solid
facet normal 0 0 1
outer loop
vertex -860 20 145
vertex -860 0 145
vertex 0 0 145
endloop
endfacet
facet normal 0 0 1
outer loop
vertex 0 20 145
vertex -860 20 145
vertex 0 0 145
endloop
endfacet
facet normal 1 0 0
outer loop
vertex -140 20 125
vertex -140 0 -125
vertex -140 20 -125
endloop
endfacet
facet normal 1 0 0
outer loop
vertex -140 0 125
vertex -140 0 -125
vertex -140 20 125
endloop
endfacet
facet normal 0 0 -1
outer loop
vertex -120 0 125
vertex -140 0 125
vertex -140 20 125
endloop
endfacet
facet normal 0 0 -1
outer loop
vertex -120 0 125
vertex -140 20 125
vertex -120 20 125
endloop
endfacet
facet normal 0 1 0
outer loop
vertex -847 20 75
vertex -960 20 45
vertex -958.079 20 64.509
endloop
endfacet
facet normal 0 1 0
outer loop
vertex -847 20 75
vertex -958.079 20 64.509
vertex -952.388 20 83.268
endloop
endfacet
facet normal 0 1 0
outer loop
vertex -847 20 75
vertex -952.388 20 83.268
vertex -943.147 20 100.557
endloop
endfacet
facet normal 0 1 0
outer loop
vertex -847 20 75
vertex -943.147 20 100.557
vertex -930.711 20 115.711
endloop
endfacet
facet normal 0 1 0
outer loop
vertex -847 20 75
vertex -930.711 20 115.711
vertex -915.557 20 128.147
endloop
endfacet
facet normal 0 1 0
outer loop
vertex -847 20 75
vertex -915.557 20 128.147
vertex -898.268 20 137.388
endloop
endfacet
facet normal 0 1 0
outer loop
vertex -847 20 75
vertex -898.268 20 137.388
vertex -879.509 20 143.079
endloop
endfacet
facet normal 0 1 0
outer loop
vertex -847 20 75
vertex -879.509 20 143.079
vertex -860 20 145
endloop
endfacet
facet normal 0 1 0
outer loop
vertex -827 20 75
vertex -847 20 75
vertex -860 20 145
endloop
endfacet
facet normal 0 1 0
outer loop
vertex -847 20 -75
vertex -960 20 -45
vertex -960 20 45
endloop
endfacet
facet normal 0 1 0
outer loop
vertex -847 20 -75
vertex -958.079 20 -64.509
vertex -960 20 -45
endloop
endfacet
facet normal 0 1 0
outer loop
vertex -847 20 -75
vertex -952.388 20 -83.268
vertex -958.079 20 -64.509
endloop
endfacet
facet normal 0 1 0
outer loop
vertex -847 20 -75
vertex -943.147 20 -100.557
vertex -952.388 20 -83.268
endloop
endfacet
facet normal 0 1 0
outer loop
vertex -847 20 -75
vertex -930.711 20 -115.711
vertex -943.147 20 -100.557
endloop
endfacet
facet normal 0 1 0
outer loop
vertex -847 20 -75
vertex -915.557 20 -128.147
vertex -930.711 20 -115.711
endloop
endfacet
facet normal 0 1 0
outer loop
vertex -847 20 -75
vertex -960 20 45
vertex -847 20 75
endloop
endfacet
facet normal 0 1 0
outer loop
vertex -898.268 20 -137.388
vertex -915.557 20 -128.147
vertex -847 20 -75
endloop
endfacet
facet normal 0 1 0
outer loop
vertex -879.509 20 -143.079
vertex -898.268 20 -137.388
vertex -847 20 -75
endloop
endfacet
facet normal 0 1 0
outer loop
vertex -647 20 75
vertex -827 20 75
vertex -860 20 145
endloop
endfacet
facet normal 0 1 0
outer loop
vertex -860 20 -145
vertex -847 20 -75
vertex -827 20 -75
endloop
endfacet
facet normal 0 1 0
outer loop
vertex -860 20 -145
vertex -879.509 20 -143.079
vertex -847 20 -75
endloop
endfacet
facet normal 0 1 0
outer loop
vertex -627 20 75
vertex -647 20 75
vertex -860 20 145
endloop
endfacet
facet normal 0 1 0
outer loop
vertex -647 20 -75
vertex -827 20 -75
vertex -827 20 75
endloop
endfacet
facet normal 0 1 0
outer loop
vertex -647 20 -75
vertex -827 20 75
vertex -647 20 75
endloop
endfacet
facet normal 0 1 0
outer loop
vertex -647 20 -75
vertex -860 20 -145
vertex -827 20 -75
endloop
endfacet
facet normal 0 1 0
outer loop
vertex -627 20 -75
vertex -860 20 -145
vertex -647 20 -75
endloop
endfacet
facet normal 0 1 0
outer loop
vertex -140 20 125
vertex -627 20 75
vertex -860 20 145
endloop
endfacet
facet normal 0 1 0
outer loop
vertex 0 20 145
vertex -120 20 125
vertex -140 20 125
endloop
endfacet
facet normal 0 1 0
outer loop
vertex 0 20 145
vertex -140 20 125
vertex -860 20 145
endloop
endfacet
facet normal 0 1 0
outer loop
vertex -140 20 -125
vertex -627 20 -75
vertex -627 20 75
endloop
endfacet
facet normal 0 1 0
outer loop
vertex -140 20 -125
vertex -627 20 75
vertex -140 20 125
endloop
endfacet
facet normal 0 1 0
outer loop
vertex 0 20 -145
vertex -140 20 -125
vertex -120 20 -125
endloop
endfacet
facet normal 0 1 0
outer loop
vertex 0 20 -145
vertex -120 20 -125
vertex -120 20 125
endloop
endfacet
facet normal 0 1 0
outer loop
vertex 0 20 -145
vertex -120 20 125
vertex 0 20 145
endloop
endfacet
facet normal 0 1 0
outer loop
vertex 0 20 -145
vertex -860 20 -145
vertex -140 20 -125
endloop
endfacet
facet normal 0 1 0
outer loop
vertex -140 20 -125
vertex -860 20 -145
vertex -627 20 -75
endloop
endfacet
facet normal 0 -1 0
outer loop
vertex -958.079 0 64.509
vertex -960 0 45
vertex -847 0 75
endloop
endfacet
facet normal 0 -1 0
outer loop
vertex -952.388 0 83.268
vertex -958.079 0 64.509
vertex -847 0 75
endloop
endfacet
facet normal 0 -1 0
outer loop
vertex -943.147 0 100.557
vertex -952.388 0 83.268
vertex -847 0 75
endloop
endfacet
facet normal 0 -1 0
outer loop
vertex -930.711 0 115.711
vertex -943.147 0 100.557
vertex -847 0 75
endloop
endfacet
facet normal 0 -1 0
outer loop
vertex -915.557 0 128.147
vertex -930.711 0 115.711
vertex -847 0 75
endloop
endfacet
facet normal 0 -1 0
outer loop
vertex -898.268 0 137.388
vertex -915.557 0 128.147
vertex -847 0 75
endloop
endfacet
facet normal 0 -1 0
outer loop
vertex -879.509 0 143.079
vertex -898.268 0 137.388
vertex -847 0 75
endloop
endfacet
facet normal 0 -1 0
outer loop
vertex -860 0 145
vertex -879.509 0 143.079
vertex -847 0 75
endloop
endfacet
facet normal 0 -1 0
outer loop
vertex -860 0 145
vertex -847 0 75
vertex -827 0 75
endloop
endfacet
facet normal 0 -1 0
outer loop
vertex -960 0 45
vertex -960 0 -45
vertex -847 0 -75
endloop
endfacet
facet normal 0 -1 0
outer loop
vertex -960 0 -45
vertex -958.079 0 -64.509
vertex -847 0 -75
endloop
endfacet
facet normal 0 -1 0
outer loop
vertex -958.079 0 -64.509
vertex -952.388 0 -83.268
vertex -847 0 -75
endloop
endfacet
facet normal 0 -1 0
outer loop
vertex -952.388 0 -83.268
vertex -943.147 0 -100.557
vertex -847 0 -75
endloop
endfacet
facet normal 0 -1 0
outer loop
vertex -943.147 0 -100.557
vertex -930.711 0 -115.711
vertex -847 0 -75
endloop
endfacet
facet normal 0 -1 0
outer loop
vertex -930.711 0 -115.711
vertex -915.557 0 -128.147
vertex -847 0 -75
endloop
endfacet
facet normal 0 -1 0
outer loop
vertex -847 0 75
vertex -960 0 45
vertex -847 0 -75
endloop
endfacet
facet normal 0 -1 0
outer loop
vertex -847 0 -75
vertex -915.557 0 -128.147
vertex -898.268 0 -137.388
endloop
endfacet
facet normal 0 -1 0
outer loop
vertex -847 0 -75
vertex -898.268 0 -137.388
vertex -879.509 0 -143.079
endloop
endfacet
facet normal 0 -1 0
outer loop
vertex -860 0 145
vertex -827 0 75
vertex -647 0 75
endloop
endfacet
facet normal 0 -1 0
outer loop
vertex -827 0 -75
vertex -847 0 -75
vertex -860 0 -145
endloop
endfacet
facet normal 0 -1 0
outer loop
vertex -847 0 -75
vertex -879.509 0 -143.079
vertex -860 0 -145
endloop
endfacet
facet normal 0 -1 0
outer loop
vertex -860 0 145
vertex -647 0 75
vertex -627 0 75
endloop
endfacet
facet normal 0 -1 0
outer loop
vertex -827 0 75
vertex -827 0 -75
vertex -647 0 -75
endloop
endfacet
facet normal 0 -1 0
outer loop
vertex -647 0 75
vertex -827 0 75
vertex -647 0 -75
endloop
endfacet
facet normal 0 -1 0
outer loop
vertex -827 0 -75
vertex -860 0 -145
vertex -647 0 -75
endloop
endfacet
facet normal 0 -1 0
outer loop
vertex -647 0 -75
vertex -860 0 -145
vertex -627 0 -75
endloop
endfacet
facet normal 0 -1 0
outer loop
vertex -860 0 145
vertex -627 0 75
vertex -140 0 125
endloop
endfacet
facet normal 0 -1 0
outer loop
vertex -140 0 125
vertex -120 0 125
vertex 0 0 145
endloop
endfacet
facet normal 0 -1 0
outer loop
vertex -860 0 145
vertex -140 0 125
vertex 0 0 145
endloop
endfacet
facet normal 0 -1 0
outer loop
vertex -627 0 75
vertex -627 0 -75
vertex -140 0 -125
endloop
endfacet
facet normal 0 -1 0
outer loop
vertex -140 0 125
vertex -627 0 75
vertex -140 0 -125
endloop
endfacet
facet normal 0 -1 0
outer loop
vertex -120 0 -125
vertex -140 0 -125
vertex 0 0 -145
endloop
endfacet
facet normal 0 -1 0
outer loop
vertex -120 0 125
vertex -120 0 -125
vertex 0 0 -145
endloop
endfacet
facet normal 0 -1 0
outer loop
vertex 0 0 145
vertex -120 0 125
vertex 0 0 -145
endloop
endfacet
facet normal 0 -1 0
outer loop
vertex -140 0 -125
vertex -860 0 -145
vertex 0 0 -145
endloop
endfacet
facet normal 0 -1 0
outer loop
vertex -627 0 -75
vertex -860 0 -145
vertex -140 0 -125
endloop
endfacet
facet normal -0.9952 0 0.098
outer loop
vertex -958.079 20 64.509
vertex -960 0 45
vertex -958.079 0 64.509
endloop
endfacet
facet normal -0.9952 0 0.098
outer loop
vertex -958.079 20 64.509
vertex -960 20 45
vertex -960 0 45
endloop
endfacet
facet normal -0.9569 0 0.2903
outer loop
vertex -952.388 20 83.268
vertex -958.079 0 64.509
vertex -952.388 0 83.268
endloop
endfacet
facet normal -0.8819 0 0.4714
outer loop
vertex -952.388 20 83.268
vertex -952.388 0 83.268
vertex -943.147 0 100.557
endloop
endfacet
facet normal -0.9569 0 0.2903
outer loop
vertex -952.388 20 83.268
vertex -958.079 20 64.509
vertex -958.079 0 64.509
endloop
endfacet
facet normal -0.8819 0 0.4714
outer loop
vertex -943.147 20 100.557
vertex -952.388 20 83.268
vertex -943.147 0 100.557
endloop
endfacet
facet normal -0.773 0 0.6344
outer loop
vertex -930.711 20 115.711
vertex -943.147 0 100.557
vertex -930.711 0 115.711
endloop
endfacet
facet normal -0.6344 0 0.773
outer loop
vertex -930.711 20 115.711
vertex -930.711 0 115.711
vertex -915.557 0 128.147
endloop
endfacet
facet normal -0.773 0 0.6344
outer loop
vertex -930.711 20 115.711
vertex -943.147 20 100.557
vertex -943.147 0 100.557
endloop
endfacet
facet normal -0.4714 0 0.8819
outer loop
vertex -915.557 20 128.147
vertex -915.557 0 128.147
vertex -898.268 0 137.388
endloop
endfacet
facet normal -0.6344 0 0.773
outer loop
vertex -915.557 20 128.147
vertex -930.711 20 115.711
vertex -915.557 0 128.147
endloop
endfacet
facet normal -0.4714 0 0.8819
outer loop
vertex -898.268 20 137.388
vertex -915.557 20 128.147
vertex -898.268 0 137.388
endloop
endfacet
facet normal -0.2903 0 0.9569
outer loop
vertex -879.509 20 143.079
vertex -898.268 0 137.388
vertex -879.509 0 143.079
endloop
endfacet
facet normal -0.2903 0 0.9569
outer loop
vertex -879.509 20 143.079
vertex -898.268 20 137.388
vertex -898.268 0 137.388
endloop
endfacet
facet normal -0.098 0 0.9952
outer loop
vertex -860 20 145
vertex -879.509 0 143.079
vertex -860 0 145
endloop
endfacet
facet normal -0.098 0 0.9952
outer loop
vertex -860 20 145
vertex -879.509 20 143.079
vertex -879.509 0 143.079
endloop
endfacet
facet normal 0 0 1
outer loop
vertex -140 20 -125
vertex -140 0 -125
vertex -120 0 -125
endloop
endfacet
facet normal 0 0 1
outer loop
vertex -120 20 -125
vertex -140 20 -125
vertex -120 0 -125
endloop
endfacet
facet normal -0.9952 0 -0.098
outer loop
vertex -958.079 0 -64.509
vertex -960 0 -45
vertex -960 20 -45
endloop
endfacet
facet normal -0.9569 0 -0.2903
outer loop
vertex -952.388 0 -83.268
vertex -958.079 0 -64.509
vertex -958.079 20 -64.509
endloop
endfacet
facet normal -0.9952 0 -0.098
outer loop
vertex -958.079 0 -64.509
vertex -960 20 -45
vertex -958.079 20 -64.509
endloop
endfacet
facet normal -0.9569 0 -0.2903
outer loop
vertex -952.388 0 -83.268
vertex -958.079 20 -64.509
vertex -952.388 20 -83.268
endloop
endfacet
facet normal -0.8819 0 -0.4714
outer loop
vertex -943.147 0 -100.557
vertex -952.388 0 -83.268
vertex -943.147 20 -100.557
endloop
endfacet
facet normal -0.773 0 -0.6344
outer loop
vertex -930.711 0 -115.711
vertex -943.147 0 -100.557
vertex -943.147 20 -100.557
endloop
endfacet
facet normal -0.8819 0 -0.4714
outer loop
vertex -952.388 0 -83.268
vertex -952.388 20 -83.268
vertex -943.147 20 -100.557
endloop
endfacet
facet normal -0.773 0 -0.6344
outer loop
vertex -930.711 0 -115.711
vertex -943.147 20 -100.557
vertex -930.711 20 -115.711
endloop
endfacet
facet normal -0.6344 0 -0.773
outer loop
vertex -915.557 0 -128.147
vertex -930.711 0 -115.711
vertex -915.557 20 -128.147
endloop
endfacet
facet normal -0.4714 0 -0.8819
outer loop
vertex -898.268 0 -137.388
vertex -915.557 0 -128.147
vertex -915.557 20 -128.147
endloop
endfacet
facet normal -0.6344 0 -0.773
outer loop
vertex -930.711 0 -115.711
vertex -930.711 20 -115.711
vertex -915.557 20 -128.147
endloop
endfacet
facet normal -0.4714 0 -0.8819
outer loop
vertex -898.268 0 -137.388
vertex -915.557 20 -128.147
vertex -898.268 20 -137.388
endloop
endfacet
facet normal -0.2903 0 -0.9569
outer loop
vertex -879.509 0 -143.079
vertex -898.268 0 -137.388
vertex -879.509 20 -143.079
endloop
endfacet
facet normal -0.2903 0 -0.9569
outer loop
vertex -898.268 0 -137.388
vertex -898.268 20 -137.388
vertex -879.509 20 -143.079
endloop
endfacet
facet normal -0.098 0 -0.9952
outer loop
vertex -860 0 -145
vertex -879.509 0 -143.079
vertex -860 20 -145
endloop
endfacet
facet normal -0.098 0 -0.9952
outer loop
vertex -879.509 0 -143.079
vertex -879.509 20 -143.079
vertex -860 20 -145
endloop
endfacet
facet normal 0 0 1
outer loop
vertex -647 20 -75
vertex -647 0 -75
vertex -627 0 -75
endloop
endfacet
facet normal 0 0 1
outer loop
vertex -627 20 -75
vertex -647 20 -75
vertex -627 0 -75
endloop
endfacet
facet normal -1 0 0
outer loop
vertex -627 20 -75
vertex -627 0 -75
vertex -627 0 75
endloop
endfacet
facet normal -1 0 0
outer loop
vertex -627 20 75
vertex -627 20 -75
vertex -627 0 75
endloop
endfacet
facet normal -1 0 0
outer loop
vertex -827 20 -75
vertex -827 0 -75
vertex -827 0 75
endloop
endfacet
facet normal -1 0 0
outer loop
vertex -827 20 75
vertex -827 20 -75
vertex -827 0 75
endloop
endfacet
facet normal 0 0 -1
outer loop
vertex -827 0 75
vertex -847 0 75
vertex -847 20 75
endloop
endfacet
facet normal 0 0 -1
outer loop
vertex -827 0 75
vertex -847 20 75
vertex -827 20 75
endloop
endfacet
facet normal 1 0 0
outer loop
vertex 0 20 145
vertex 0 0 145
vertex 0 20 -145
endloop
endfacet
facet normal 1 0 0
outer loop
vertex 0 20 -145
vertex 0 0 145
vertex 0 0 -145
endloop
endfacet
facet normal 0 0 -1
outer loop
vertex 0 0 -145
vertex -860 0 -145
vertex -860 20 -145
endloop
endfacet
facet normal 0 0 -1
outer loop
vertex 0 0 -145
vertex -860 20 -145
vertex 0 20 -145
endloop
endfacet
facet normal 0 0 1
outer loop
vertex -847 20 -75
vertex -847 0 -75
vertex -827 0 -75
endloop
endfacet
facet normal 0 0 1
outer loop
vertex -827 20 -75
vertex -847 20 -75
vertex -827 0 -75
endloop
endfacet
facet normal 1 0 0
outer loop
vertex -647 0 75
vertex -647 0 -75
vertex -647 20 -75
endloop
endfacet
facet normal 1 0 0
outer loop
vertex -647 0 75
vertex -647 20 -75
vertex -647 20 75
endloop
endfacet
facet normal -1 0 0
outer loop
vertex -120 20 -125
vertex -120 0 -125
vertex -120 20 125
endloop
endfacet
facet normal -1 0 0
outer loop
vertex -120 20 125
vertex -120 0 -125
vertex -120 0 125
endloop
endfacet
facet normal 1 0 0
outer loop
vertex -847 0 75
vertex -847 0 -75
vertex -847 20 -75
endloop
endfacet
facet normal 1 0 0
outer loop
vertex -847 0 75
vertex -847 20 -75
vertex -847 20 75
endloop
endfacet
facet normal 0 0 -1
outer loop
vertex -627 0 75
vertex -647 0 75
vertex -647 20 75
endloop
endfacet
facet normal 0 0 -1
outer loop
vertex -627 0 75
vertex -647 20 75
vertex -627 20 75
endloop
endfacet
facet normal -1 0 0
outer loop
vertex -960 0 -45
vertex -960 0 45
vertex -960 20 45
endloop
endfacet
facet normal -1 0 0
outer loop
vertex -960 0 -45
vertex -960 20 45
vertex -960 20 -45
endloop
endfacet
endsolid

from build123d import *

# Parameters (mm, degrees)
SKETCH1_W           = 960
SKETCH1_H           = 290
BOSS_EXTRUDE1_DEPTH = 20
FILLET1_R           = 100
SKETCH5_W           = 20
SKETCH5_H           = 250
SKETCH5_H_2         = 150
CUT_EXTRUDE1_DEPTH  = 20


with BuildPart() as part:
    # Sketch1 → Boss-Extrude1 (new body)
    with BuildSketch(Plane(origin=(0, 0, 0), x_dir=(1, 0, 0), z_dir=(0, 1, 0))):
        with Locations((-480, 0)):
            Rectangle(SKETCH1_W, SKETCH1_H)
    extrude(amount=BOSS_EXTRUDE1_DEPTH)

    # Fillet1
    fillet1_edges = [part.edges().sort_by_distance(p)[0] for p in [
        (-960, 10, 145),
        (-960, 10, -145),
    ]]
    fillet(fillet1_edges, radius=FILLET1_R)

    # Sketch5 → Cut-Extrude1 (cut)
    with BuildSketch(Plane.XZ):
        with Locations((-130, 0)):
            Rectangle(SKETCH5_W, SKETCH5_H)
        with Locations((-637, 0)):
            Rectangle(SKETCH5_W, SKETCH5_H_2)
        with Locations((-837, 0)):
            Rectangle(SKETCH5_W, SKETCH5_H_2)
    extrude(amount=-CUT_EXTRUDE1_DEPTH, mode=Mode.SUBTRACT)


solid = part.part
